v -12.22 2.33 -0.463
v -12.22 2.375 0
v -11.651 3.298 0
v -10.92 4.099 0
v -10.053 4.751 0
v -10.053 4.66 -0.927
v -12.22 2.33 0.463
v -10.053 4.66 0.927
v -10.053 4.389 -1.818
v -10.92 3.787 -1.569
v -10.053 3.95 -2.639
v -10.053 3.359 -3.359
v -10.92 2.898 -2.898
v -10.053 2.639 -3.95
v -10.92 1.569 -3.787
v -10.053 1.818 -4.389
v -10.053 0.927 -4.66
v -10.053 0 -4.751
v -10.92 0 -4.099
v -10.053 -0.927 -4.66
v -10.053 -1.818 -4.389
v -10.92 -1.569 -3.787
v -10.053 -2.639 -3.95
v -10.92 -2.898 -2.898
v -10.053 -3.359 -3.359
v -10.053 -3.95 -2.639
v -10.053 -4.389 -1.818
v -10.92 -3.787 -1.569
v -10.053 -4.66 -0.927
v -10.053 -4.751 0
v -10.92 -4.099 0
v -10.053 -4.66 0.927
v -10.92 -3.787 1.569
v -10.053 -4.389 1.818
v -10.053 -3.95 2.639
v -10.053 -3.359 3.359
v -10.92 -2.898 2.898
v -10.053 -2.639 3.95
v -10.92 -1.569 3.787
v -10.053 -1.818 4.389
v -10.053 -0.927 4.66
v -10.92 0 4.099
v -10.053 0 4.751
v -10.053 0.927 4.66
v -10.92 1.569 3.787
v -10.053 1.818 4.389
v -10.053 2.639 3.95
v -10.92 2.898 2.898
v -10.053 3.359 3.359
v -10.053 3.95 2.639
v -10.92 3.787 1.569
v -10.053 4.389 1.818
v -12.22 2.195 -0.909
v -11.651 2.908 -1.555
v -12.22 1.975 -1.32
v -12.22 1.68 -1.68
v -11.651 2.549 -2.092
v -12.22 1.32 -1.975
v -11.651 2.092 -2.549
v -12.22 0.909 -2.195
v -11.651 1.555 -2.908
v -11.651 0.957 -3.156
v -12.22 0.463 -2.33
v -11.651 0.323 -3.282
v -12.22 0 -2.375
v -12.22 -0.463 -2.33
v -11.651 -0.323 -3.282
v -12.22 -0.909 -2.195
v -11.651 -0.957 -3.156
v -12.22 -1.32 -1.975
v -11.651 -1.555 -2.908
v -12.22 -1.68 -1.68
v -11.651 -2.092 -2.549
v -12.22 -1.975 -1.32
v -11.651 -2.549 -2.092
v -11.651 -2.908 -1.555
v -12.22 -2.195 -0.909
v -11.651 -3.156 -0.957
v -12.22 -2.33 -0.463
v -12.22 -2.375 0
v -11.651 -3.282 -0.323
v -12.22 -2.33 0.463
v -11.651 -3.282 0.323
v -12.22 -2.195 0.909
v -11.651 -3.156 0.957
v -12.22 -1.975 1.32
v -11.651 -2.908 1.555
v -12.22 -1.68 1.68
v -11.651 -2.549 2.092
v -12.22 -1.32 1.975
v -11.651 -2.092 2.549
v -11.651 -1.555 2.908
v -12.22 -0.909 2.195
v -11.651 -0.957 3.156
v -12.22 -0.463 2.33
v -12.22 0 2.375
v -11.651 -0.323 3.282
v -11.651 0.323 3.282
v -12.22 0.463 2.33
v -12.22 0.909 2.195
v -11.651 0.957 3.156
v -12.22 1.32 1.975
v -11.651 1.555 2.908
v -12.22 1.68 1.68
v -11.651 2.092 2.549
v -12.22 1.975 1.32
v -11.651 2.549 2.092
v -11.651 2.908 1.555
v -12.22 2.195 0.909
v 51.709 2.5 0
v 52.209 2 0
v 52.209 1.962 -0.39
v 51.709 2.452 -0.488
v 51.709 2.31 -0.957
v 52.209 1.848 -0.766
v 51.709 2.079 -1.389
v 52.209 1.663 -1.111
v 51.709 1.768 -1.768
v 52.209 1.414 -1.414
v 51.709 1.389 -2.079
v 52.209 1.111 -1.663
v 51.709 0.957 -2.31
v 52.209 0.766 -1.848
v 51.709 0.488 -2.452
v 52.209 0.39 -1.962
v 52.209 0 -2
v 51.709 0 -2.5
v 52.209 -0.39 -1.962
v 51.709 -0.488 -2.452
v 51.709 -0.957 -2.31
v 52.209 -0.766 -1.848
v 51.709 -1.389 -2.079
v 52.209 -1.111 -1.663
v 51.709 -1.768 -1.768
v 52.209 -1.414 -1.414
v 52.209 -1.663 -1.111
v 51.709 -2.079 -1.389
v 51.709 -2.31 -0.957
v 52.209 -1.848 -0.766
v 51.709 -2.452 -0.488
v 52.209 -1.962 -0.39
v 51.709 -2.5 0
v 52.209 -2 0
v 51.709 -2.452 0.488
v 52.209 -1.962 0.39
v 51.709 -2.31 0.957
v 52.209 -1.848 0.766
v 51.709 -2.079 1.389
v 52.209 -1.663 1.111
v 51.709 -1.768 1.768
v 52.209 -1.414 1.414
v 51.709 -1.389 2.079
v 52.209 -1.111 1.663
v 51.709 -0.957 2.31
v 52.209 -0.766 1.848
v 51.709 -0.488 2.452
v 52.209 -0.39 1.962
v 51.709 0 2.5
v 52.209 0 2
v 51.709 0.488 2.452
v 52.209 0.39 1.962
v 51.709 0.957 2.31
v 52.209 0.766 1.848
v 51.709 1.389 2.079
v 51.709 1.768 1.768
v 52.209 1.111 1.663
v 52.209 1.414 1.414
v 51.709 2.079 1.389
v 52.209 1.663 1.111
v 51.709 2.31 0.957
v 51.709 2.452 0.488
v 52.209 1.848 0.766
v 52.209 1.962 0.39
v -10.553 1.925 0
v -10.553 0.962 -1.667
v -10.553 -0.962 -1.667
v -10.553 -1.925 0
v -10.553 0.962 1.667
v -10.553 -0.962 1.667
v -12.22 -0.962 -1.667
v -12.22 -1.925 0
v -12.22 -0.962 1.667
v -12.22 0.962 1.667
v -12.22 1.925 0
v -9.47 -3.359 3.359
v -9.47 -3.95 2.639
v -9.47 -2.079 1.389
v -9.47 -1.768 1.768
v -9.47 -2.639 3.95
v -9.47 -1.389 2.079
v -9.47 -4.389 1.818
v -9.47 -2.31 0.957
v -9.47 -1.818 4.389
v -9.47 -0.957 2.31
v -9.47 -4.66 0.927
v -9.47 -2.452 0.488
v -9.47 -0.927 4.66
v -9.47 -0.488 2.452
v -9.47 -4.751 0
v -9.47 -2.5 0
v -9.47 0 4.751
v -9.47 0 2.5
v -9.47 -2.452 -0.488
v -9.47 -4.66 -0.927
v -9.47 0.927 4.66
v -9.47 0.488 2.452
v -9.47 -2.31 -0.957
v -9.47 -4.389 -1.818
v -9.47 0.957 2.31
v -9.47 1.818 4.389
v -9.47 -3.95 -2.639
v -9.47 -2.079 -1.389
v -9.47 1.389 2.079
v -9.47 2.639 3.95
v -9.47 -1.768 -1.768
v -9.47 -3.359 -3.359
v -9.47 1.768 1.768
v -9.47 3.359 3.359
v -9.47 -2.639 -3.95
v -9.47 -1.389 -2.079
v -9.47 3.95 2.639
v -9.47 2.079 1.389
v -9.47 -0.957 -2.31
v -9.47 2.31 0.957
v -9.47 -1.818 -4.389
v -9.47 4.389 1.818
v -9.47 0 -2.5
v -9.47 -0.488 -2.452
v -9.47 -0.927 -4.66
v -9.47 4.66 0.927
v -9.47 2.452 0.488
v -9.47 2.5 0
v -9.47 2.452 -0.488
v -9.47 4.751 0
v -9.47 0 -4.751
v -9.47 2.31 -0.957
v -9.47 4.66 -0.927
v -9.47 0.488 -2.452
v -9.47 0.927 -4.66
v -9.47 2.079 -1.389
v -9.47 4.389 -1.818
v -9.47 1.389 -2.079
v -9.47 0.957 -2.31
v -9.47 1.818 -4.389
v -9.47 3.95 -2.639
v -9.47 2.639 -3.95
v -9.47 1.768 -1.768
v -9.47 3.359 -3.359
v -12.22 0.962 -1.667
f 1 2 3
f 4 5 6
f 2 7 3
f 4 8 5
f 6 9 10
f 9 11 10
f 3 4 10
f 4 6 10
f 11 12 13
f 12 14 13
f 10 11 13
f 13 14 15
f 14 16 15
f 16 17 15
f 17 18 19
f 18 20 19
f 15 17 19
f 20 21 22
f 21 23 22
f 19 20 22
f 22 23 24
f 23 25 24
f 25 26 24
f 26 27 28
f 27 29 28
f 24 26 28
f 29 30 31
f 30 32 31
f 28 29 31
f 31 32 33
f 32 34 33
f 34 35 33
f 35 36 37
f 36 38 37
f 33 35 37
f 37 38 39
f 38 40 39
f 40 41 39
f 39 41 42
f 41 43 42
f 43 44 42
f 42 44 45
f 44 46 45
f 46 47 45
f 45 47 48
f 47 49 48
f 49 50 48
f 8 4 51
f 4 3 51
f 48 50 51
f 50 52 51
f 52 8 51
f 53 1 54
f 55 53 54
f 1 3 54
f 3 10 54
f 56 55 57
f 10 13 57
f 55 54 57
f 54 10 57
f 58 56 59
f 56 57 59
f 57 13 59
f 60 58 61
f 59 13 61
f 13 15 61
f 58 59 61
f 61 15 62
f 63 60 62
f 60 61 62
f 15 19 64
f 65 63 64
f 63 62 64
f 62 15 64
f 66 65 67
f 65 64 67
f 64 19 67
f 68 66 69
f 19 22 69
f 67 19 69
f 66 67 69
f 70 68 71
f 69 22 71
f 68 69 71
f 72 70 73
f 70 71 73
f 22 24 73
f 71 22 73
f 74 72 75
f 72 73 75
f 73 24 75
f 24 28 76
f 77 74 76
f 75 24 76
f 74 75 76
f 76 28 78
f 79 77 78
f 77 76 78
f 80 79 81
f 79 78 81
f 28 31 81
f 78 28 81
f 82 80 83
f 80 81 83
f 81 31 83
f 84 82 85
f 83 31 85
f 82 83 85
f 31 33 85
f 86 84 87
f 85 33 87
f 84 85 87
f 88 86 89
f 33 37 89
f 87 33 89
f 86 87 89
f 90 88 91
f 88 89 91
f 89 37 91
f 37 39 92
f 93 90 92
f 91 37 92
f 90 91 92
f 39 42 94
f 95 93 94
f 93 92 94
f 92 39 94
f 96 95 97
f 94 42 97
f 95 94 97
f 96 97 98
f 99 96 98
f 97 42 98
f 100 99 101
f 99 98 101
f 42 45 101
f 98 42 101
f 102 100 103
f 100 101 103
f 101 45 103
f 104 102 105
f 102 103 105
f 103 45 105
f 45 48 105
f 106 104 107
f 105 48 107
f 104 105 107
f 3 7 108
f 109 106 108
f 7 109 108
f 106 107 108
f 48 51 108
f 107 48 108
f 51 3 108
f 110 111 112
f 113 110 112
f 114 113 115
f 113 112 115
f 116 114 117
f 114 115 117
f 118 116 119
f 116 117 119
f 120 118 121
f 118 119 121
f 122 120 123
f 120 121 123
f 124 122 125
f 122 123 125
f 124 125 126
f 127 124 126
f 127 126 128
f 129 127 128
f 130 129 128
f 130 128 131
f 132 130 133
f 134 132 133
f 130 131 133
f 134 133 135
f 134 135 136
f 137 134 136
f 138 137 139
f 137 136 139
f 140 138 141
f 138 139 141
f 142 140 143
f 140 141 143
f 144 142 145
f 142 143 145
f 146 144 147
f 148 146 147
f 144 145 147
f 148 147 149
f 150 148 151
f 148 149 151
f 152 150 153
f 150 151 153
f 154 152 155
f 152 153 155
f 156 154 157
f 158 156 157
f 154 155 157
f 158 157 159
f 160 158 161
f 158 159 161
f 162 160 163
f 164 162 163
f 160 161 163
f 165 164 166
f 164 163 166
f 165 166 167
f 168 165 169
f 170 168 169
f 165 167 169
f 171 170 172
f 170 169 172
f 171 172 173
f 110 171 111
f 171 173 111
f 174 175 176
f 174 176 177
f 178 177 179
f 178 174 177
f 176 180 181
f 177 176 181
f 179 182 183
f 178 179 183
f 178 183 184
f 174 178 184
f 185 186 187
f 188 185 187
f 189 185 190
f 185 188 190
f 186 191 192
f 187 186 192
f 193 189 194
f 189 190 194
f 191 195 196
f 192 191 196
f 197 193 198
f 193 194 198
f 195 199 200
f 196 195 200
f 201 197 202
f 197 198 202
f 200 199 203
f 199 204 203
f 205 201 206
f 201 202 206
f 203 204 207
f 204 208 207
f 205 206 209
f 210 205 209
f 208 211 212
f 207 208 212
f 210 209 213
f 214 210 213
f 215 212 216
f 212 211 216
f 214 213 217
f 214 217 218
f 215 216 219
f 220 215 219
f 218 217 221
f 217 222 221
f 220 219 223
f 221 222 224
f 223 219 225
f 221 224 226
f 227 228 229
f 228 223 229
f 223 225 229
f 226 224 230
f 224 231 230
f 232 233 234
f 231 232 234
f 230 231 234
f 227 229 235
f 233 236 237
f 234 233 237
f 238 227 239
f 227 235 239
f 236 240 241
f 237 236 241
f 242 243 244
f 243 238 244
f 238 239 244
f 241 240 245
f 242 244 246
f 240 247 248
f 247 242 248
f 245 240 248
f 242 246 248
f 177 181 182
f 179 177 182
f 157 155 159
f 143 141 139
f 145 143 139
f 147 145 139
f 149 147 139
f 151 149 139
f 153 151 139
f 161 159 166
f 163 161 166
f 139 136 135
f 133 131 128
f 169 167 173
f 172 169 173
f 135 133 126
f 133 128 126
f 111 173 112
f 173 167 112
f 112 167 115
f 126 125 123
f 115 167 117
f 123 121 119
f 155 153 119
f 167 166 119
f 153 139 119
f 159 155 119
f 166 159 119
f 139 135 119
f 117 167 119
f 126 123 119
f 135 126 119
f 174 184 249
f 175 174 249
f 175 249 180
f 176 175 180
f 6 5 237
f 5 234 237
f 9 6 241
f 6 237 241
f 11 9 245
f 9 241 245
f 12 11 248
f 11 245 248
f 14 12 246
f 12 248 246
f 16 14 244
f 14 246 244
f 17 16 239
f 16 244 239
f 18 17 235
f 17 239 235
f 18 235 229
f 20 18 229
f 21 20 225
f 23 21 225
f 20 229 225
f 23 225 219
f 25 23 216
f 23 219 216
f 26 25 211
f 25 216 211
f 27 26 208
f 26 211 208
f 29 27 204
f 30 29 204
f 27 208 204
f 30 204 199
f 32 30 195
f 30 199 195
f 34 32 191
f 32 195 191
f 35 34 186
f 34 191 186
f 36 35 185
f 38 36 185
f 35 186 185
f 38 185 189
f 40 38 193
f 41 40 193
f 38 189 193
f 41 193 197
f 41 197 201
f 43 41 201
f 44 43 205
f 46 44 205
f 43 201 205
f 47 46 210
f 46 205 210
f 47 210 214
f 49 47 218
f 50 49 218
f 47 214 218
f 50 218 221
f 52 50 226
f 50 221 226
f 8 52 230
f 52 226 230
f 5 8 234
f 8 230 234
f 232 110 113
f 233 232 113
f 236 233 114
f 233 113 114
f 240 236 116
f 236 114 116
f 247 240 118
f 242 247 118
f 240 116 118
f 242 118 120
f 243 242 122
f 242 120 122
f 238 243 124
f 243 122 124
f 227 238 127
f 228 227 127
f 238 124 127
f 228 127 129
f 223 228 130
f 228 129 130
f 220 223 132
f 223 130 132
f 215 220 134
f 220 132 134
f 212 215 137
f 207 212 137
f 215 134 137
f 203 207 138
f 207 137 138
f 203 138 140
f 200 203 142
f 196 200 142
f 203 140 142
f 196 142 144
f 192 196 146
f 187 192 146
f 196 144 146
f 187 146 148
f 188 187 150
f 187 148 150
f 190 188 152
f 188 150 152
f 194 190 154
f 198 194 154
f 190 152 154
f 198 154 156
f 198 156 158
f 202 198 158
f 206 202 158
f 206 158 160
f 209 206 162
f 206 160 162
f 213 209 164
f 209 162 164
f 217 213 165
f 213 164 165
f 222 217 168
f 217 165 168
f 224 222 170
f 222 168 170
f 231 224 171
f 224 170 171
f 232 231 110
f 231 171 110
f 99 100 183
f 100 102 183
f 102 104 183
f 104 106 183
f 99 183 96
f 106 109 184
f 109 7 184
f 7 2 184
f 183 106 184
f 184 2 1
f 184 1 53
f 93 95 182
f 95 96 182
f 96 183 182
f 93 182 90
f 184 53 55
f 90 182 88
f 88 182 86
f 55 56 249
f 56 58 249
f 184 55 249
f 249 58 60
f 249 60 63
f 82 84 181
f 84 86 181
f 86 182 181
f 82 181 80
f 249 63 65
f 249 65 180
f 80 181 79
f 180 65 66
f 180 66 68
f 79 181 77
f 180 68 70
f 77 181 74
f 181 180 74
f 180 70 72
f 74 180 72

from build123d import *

# Parameters (mm, degrees)
CHAMFER1_SIZE      = 0.3
CUT_EXTRUDE1_DEPTH = 1
SCALE1_SCALE       = 1.667


with BuildPart() as part:
    # Sketch1 → Revolve1 (revolve)
    with BuildSketch(Plane.XY):
        with BuildLine():
            Line((38.65, 0), (0, 0))
            Line((0, 0), (0, 1.425))
            ThreePointArc((0, 1.425), (0.549895392, 2.228823502), (1.3, 2.85))
            Line((1.3, 2.85), (1.65, 2.85))
            Line((1.65, 2.85), (1.65, 1.5))
            Line((1.65, 1.5), (38.65, 1.5))
            Line((38.65, 1.5), (38.65, 0))
        make_face()
    revolve(axis=Axis((38.65, 0, 0), (-1, 0, 0)))

    # Chamfer1
    chamfer1_edges = [part.edges().sort_by_distance(p)[0] for p in [
        (38.65, -1.5, 0),
    ]]
    chamfer(chamfer1_edges, length=CHAMFER1_SIZE)

    # Sketch2 → Cut-Extrude1 (cut)
    with BuildSketch(Plane.ZY):
        Polygon((0, 1.154700538), (-1, 0.577350269), (-1, -0.577350269), (0, -1.154700538), (1, -0.577350269), (1, 0.577350269), align=None)
    extrude(amount=-CUT_EXTRUDE1_DEPTH, mode=Mode.SUBTRACT)


with BuildPart() as part_1:
    # Scale1: scaled about (18.321522069, 0, 0)
    add(part.part.scale(SCALE1_SCALE).moved(Location((-12.22045522, 0, 0))))


solid = part_1.part
